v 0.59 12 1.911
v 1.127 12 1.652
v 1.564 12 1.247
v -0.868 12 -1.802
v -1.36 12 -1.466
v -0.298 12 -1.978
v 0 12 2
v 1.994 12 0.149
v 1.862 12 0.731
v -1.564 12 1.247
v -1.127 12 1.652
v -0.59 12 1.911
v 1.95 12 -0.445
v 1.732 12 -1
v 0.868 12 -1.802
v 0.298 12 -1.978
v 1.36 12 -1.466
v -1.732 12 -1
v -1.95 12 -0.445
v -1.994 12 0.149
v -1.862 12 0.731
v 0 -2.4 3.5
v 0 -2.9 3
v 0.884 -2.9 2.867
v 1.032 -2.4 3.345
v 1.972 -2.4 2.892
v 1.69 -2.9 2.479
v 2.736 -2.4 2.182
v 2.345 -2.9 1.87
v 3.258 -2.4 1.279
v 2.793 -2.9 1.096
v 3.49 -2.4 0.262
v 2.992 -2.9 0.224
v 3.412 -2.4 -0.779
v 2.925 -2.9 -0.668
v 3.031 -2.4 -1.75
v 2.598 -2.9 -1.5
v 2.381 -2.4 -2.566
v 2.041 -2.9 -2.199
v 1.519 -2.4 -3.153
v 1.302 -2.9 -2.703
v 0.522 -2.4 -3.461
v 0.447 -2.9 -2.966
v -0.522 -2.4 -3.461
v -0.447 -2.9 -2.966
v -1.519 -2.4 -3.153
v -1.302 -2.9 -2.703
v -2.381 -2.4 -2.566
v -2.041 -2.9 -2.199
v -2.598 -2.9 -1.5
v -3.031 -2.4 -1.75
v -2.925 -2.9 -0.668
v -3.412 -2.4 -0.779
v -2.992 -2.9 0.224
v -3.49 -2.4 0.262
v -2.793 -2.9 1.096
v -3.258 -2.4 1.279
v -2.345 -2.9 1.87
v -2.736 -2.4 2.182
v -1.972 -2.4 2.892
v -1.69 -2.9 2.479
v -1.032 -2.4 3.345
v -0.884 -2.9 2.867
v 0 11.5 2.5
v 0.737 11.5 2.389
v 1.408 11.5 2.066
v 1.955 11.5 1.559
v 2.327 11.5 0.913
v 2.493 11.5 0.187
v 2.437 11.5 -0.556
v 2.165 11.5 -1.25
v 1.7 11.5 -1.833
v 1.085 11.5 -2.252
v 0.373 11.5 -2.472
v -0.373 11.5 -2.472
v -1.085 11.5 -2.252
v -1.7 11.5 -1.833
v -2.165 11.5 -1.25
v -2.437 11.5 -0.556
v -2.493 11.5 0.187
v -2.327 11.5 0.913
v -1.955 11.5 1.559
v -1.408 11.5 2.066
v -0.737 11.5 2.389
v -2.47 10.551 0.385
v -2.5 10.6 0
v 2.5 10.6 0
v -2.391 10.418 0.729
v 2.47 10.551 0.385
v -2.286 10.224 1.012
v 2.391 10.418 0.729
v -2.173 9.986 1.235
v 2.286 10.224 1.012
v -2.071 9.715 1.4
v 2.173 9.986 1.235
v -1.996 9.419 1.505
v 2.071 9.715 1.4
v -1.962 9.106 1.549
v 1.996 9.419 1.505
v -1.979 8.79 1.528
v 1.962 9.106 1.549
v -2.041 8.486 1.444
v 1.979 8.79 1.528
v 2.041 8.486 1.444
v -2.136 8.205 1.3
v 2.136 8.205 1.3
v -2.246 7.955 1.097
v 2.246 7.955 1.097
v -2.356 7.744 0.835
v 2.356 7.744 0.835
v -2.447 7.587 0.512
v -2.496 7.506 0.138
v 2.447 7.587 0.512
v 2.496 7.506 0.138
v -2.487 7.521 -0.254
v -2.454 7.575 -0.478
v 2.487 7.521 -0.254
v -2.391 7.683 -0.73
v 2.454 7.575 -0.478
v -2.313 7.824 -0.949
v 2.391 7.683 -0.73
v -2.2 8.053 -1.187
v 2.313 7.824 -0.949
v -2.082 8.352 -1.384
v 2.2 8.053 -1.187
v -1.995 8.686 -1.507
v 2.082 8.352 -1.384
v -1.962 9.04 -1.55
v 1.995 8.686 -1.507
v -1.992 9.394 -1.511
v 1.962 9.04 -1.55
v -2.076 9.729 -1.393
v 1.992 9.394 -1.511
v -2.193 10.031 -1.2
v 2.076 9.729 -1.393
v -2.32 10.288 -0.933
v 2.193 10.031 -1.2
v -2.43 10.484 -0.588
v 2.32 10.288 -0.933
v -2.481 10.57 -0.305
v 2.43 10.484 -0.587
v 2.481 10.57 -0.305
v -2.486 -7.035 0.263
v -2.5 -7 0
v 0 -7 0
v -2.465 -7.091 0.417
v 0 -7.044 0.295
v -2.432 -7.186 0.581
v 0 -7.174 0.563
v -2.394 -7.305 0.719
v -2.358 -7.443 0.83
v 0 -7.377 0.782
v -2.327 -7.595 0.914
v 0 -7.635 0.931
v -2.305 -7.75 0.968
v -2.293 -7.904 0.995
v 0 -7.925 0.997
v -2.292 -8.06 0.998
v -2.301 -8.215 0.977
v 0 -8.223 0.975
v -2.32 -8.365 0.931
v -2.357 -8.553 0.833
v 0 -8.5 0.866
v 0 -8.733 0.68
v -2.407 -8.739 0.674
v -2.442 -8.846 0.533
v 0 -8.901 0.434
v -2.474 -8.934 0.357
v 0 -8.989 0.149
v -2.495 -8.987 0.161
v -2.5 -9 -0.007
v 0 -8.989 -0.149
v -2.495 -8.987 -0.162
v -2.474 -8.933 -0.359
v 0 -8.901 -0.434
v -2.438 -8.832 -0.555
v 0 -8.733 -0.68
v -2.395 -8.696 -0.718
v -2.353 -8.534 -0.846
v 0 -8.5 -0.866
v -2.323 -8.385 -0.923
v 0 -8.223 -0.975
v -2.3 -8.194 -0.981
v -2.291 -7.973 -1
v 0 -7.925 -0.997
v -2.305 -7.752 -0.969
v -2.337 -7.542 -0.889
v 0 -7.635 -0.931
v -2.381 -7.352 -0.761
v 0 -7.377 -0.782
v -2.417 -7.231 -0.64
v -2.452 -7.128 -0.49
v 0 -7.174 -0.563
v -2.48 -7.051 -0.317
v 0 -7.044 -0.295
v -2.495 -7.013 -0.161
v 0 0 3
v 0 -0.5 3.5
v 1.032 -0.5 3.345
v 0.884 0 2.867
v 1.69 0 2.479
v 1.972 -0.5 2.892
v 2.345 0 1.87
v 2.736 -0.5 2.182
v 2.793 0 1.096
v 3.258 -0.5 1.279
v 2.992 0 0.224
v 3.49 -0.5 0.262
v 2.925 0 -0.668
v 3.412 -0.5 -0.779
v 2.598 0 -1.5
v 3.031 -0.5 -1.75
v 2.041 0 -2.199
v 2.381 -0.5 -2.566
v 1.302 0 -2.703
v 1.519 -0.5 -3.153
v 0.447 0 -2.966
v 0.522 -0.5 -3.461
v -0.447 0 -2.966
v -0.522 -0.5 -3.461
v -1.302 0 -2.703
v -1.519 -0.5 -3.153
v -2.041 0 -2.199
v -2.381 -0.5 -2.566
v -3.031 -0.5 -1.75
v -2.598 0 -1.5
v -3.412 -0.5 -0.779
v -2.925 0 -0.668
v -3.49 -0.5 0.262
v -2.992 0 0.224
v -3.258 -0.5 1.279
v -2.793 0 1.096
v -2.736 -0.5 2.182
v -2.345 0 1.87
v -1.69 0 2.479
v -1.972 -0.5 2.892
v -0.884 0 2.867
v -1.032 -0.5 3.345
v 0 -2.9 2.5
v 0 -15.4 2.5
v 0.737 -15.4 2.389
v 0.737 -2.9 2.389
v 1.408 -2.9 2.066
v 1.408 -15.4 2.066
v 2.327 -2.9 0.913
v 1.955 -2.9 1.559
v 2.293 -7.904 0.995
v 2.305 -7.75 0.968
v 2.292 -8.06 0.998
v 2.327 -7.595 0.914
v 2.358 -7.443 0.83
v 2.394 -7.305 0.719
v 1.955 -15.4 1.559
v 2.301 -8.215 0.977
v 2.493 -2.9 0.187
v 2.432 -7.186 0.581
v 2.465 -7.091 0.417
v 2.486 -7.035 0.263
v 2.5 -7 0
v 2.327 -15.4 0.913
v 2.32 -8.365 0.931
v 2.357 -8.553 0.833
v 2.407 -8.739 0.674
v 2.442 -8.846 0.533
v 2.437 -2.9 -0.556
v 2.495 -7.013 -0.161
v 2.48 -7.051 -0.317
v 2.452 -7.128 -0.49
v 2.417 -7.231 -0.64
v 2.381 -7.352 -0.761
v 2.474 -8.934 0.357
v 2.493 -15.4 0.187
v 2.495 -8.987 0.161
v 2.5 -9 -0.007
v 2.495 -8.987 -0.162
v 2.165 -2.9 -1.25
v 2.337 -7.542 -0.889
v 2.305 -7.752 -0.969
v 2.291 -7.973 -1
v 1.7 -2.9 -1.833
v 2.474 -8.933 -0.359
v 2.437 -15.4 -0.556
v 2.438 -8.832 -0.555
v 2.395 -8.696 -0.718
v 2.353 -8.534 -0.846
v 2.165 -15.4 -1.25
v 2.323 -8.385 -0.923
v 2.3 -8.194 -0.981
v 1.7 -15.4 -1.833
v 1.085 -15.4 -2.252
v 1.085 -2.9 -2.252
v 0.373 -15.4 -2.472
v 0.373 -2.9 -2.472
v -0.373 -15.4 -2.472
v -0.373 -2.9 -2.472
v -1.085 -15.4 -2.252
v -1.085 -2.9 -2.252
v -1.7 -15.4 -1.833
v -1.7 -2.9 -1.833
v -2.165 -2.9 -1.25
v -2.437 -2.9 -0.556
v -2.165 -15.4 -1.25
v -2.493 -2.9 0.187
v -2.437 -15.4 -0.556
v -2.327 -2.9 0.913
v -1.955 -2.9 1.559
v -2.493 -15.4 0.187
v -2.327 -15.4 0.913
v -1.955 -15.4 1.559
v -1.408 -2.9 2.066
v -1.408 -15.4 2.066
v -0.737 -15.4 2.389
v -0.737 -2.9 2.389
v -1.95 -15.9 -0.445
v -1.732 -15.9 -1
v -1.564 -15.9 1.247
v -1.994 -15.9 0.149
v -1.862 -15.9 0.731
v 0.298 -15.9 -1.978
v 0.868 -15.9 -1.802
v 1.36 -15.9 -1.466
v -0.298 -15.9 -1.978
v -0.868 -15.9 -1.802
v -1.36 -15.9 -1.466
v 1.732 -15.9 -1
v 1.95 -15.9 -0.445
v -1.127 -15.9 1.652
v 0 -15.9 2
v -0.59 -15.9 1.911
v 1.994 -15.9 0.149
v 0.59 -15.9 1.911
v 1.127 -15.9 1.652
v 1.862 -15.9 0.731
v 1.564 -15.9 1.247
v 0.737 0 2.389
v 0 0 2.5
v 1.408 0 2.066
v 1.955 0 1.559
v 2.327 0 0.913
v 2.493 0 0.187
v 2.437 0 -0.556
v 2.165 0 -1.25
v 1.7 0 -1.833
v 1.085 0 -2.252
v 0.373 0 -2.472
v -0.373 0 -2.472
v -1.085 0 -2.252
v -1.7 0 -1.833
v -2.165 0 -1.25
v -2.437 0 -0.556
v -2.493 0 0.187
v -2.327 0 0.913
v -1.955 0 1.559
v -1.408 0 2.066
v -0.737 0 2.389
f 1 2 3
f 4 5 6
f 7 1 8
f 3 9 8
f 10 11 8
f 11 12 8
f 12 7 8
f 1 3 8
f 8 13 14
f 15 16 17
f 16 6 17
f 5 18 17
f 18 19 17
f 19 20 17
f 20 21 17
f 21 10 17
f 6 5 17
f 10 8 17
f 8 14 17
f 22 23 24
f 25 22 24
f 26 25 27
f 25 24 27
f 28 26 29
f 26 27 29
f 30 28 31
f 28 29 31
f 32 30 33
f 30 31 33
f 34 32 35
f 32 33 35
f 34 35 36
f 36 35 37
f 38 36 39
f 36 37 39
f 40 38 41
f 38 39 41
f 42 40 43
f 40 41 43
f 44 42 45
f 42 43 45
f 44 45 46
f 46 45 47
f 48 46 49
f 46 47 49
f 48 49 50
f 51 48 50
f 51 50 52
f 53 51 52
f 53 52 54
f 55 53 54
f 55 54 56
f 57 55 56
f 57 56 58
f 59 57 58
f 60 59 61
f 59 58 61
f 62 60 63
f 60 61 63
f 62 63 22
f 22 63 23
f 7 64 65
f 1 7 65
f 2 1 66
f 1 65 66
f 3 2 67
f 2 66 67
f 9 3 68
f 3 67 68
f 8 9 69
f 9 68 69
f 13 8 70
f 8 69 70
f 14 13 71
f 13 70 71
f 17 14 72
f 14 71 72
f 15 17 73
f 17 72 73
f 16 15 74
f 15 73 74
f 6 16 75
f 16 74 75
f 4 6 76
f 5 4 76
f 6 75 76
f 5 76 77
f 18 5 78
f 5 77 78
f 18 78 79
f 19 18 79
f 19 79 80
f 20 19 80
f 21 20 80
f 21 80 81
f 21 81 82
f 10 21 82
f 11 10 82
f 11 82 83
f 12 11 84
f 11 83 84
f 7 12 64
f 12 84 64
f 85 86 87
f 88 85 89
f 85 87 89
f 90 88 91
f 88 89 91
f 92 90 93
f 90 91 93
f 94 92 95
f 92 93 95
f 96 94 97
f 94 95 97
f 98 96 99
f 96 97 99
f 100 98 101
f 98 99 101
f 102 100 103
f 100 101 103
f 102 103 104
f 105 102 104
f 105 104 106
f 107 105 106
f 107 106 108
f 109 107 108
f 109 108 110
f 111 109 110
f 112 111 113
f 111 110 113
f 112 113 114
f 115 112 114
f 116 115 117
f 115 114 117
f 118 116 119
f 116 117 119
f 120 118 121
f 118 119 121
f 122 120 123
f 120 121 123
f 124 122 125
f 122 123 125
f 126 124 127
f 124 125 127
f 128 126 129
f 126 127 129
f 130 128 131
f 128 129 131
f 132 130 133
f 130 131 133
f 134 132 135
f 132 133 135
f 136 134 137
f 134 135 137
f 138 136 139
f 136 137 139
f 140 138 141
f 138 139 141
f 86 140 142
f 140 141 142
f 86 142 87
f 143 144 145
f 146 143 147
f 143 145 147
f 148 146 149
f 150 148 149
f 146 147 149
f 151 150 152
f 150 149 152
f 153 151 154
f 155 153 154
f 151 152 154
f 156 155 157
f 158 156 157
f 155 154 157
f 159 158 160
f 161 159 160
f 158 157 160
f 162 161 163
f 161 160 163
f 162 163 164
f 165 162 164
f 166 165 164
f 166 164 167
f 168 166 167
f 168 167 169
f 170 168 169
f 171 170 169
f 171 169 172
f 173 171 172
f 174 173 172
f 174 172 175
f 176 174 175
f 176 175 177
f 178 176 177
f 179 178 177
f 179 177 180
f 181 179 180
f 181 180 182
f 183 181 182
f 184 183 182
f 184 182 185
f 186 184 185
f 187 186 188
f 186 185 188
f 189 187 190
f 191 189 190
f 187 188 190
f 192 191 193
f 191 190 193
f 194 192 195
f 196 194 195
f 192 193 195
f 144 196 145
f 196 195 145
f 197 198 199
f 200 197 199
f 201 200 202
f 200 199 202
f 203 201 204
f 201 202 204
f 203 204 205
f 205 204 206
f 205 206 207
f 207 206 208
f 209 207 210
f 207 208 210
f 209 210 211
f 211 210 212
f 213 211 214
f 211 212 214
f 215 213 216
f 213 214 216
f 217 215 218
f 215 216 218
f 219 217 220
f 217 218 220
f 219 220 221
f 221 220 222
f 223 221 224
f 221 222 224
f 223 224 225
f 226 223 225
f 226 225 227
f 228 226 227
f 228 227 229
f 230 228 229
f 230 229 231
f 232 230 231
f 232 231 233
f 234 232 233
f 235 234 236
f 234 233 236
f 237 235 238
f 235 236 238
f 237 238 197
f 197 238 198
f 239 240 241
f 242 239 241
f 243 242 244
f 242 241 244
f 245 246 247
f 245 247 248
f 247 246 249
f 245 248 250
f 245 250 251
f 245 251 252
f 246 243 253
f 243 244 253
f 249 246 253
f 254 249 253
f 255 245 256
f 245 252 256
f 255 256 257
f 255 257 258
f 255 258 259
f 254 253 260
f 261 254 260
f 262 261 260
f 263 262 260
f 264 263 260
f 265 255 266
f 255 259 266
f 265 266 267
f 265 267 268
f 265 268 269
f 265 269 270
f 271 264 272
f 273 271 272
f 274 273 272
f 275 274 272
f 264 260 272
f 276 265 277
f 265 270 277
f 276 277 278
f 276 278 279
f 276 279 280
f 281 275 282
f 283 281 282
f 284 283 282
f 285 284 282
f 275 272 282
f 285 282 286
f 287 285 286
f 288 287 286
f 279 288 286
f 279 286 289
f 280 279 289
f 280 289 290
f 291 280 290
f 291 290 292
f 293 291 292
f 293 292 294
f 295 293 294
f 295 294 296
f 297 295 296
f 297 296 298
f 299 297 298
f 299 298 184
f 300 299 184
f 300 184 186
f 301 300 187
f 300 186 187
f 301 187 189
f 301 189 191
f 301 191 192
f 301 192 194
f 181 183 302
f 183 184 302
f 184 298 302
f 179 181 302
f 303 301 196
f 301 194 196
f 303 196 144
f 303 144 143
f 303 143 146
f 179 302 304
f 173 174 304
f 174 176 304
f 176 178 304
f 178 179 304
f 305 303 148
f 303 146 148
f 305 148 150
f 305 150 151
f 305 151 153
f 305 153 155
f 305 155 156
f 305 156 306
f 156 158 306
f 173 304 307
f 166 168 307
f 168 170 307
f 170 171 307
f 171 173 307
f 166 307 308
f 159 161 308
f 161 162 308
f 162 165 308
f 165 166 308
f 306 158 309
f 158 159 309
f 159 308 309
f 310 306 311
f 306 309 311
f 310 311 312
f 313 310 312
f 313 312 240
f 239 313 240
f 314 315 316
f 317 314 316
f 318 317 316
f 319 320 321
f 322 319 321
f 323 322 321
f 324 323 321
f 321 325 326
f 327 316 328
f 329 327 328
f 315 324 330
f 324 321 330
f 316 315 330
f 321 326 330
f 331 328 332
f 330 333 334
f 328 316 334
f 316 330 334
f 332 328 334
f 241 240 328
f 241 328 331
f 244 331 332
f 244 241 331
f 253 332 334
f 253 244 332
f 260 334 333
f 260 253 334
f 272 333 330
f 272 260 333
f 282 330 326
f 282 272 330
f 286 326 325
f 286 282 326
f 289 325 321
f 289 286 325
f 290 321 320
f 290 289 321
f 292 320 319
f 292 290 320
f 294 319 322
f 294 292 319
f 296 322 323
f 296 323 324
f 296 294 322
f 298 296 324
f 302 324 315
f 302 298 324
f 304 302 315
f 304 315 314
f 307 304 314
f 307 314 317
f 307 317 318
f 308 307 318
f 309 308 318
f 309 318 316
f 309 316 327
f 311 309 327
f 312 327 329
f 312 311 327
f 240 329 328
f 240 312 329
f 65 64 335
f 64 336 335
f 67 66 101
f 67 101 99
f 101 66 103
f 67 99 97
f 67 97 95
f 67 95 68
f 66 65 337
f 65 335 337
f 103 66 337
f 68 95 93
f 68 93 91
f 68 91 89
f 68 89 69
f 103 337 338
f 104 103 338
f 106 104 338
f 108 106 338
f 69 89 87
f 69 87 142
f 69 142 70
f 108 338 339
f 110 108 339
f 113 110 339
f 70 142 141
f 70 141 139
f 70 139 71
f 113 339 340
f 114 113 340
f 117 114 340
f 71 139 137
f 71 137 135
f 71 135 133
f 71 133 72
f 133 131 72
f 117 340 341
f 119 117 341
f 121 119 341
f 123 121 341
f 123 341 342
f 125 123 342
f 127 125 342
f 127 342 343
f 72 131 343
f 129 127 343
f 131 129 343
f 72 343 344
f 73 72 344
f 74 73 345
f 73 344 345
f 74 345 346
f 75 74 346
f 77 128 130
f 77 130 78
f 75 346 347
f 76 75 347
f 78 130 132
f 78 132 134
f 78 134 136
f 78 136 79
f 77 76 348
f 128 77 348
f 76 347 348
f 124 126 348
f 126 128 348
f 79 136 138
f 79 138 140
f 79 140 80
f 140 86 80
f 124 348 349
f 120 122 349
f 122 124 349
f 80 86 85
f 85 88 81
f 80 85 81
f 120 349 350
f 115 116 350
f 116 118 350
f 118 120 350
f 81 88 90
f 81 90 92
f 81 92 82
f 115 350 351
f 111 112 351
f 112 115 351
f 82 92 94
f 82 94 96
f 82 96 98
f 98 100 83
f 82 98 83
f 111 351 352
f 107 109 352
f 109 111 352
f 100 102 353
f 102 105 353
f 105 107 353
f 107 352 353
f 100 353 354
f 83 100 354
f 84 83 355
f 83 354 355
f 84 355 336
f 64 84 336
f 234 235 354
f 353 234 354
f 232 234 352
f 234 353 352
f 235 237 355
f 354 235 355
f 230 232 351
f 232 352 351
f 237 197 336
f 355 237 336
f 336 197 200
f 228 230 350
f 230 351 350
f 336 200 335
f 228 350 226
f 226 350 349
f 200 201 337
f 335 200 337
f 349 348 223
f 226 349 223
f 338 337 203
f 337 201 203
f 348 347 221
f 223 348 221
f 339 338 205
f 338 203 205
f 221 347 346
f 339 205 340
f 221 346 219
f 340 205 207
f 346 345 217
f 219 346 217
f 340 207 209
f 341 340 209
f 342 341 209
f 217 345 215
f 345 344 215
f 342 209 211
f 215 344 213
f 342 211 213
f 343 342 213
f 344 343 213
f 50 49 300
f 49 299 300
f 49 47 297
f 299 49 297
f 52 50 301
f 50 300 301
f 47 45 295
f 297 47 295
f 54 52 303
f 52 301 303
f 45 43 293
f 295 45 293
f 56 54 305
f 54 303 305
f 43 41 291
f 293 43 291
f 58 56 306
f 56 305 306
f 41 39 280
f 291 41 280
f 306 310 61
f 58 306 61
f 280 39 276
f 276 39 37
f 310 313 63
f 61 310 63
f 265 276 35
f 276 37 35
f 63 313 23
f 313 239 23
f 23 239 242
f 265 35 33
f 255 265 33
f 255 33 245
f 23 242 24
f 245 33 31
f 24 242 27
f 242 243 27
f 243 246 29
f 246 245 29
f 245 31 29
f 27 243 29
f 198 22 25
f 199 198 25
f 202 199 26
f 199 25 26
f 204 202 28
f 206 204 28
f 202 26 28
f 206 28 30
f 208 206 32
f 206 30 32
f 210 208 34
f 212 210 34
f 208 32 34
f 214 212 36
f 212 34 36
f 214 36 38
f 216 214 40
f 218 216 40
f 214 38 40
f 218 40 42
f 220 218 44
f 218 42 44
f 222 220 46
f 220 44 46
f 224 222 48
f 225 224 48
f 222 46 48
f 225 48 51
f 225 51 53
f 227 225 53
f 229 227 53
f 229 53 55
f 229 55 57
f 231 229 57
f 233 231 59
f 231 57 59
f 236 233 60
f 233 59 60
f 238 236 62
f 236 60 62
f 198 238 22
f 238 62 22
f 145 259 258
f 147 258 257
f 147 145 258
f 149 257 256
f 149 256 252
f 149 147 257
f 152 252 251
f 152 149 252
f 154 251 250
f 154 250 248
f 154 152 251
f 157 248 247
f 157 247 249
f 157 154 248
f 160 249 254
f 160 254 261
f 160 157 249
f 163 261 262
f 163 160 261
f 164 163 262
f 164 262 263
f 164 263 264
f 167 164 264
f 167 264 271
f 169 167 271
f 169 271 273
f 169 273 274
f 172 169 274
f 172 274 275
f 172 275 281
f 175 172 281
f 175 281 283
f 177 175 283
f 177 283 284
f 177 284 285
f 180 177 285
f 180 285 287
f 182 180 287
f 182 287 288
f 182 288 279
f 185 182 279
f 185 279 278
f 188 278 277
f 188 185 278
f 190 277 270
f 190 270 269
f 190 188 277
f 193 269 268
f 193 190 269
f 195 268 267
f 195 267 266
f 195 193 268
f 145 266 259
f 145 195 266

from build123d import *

# Parameters (mm, degrees)
F2_SIZE  = 0.5
F3_R     = 1
F3_R_2   = 1.55
F4_DEPTH = 12.5


with BuildPart() as f1:
    # F0 (on Right) → F1 (revolve)
    with BuildSketch(Plane.YZ):
        Polygon((-15.9, 2.5), (-15.9, 0), (10, 0), (12, 0), (12, 2.5), (4, 2.5), (0, 2.5), (0, 3.5), (-2.9, 3.5), (-2.9, 2.5), align=None)
    revolve(axis=Axis((0, -0.324999528, 0), (0, 1, 0)))

    # F2
    f2_edges = [f1.edges().sort_by_distance(p)[0] for p in [
        (0, -15.9, -2.5),
        (0, 0, -3.5),
        (0, -2.9, -3.5),
        (0, -1.45, 3.5),
        (0, 12, -2.5),
    ]]
    chamfer(f2_edges, length=F2_SIZE)

    # F3 (on Right) → F4 (cut, symmetric)
    with BuildSketch(Plane.YZ):
        with Locations((-8, 0)):
            Circle(F3_R)
        with Locations((9.05, 0)):
            Circle(F3_R_2)
    extrude(amount=F4_DEPTH, both=True, mode=Mode.SUBTRACT)


solid = f1.part
